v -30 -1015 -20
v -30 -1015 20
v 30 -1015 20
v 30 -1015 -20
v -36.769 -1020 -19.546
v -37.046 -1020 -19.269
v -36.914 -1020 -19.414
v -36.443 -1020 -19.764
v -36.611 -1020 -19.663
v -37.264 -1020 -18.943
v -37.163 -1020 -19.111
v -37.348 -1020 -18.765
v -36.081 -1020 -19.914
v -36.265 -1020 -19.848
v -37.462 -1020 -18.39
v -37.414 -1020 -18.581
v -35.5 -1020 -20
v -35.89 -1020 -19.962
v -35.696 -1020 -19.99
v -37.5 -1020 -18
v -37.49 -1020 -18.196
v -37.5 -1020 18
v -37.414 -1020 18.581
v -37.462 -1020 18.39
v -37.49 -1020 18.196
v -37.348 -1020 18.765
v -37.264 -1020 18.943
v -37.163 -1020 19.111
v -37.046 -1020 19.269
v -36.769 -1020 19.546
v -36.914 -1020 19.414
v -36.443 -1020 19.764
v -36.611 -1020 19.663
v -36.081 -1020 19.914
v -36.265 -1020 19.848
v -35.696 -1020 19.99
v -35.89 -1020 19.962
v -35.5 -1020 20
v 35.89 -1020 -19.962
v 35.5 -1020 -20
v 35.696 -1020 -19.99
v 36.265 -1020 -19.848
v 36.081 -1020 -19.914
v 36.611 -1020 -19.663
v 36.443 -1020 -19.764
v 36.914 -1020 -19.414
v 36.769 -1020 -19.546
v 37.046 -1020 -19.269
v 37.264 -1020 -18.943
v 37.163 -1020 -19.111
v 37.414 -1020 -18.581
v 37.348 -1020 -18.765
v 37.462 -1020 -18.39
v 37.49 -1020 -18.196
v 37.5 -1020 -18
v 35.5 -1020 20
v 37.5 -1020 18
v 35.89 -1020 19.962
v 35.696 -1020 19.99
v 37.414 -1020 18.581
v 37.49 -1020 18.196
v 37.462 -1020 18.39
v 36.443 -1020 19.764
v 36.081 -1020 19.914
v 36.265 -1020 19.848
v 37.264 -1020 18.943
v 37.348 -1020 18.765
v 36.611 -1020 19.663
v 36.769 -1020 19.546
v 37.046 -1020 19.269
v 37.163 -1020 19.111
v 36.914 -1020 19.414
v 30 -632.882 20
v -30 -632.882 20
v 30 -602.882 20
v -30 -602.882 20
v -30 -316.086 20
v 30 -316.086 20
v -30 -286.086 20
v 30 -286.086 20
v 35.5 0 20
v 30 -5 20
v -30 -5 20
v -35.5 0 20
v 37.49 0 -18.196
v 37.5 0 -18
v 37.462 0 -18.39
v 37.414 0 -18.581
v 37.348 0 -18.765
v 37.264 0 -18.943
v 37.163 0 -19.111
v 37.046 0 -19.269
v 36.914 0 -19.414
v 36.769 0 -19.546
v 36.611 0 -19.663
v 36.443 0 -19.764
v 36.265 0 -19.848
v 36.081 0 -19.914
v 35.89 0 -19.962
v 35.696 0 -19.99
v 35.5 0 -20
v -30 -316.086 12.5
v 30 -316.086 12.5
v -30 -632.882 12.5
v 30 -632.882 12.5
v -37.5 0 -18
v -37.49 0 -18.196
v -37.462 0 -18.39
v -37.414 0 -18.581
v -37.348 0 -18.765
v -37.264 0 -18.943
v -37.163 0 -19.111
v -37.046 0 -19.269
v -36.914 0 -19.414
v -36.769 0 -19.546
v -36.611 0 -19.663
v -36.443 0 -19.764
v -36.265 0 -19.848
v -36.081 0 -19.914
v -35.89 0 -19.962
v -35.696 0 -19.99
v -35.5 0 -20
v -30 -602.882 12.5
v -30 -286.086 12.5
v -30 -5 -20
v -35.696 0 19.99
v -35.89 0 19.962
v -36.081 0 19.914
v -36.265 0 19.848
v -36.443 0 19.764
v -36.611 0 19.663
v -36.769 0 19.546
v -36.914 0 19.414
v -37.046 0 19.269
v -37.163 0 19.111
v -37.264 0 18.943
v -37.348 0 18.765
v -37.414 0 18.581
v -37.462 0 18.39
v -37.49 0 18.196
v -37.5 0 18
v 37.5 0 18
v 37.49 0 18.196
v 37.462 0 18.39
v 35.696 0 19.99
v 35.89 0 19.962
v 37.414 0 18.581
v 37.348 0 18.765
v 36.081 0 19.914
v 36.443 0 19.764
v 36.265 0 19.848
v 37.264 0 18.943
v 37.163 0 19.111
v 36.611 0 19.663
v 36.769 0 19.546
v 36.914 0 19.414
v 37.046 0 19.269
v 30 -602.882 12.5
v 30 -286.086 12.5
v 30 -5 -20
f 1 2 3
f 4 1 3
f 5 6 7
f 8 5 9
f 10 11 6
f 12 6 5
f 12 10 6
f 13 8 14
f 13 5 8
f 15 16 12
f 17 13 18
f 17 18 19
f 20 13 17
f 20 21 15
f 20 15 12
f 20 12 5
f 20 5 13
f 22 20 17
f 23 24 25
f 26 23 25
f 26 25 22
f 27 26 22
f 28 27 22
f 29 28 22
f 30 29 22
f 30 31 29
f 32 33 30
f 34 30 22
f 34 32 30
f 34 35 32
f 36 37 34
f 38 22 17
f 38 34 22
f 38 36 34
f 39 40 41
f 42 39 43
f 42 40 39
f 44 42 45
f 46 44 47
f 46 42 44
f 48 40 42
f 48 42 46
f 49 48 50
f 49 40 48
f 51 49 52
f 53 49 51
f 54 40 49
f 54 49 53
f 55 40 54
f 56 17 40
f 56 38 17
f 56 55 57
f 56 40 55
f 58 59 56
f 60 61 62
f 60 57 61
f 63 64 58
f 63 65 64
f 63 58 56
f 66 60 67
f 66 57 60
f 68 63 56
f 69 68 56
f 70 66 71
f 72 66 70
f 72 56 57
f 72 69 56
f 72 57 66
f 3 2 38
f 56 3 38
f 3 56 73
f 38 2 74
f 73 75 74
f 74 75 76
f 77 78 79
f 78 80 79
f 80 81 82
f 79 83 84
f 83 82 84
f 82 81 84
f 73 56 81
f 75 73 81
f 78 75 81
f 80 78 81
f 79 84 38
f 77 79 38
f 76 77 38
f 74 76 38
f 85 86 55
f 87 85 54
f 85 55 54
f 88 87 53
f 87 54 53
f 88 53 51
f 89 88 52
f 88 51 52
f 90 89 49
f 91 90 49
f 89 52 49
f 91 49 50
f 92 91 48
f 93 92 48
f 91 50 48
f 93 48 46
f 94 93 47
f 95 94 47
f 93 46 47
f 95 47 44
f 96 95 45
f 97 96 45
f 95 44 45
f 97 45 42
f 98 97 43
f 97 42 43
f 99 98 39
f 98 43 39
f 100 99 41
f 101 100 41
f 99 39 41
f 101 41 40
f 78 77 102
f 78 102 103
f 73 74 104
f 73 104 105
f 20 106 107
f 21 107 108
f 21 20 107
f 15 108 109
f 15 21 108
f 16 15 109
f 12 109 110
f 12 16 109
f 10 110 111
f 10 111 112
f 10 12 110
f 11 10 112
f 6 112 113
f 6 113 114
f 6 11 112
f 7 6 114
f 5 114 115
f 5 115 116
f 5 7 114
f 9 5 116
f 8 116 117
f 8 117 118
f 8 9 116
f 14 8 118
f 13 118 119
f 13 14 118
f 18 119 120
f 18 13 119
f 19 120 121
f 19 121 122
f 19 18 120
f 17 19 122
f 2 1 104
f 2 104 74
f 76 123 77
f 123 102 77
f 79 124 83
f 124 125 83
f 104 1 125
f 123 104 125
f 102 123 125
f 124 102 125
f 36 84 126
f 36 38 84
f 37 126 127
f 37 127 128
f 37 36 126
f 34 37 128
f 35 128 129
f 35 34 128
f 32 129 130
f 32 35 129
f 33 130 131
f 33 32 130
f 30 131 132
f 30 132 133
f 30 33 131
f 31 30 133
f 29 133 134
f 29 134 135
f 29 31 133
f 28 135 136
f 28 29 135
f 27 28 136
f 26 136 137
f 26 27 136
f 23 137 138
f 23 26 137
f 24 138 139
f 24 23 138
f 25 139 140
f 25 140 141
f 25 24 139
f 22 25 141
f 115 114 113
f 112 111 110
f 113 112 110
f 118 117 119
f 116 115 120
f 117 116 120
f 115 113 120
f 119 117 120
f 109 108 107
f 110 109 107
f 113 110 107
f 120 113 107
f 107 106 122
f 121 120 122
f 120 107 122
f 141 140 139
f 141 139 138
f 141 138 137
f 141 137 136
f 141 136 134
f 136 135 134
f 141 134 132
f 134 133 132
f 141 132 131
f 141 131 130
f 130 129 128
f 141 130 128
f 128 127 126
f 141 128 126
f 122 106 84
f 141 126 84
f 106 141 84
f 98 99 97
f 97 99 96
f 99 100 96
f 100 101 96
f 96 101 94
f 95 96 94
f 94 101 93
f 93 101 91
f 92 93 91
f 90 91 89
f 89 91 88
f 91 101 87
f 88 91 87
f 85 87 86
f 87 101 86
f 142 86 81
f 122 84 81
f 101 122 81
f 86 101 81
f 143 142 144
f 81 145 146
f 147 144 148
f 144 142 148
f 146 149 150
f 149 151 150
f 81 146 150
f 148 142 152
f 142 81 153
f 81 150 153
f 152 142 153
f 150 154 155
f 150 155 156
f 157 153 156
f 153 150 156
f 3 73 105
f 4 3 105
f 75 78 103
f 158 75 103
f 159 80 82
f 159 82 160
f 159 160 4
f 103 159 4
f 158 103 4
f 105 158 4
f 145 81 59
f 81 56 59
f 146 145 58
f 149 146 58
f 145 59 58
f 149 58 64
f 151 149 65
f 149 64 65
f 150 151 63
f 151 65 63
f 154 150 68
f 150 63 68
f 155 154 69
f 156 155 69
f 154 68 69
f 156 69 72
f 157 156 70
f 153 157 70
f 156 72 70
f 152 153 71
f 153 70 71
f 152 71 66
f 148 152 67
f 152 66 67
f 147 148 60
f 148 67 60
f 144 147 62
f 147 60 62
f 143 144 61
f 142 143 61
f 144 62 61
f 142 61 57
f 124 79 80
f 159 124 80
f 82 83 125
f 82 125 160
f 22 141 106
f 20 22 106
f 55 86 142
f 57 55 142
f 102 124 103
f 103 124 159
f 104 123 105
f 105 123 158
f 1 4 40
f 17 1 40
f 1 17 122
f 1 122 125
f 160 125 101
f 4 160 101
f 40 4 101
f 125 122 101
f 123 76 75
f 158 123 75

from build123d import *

# Parameters (mm, degrees)
F1_DEPTH = 1020
F2_W     = 60
F2_H     = 382.118
F2_H_2   = 286.796
F2_H_3   = 281.086
F3_DEPTH = 60
F4_DEPTH = 32.5
F5_R     = 2


with BuildPart() as f1:
    # F0 (on Front) → F1 (new body)
    with BuildSketch(Plane.XZ):
        Polygon((30, -20), (37.5, -20), (37.5, 20), (-37.5, 20), (-37.5, -20), (-30, -20), (-30, -12.5), (-30, 12.5), (30, 12.5), (30, -12.5), align=None)
    extrude(amount=F1_DEPTH)

    # F2 (on face) → F3 (cut)
    with BuildSketch(Plane.XY.offset(20)):
        with Locations((0, -823.941)):
            Rectangle(F2_W, F2_H)
        with Locations((0, -459.484)):
            Rectangle(F2_W, F2_H_2)
        with Locations((0, -145.543)):
            Rectangle(F2_W, F2_H_3)
    extrude(amount=-F3_DEPTH, mode=Mode.SUBTRACT)

    # F4 (add): faces of the model
    f4_faces = [f1.faces().sort_by_distance(p)[0] for p in [
        (0, -1017.5, 12.5),
        (0, -2.5, 12.5),
    ]]
    extrude(f4_faces, amount=F4_DEPTH)

    # F5
    f5_edges = [f1.edges().sort_by_distance(p)[0] for p in [
        (-37.5, -510, 20),
        (37.5, -510, 20),
        (-37.5, -510, -20),
        (37.5, -510, -20),
    ]]
    fillet(f5_edges, radius=F5_R)


solid = f1.part
